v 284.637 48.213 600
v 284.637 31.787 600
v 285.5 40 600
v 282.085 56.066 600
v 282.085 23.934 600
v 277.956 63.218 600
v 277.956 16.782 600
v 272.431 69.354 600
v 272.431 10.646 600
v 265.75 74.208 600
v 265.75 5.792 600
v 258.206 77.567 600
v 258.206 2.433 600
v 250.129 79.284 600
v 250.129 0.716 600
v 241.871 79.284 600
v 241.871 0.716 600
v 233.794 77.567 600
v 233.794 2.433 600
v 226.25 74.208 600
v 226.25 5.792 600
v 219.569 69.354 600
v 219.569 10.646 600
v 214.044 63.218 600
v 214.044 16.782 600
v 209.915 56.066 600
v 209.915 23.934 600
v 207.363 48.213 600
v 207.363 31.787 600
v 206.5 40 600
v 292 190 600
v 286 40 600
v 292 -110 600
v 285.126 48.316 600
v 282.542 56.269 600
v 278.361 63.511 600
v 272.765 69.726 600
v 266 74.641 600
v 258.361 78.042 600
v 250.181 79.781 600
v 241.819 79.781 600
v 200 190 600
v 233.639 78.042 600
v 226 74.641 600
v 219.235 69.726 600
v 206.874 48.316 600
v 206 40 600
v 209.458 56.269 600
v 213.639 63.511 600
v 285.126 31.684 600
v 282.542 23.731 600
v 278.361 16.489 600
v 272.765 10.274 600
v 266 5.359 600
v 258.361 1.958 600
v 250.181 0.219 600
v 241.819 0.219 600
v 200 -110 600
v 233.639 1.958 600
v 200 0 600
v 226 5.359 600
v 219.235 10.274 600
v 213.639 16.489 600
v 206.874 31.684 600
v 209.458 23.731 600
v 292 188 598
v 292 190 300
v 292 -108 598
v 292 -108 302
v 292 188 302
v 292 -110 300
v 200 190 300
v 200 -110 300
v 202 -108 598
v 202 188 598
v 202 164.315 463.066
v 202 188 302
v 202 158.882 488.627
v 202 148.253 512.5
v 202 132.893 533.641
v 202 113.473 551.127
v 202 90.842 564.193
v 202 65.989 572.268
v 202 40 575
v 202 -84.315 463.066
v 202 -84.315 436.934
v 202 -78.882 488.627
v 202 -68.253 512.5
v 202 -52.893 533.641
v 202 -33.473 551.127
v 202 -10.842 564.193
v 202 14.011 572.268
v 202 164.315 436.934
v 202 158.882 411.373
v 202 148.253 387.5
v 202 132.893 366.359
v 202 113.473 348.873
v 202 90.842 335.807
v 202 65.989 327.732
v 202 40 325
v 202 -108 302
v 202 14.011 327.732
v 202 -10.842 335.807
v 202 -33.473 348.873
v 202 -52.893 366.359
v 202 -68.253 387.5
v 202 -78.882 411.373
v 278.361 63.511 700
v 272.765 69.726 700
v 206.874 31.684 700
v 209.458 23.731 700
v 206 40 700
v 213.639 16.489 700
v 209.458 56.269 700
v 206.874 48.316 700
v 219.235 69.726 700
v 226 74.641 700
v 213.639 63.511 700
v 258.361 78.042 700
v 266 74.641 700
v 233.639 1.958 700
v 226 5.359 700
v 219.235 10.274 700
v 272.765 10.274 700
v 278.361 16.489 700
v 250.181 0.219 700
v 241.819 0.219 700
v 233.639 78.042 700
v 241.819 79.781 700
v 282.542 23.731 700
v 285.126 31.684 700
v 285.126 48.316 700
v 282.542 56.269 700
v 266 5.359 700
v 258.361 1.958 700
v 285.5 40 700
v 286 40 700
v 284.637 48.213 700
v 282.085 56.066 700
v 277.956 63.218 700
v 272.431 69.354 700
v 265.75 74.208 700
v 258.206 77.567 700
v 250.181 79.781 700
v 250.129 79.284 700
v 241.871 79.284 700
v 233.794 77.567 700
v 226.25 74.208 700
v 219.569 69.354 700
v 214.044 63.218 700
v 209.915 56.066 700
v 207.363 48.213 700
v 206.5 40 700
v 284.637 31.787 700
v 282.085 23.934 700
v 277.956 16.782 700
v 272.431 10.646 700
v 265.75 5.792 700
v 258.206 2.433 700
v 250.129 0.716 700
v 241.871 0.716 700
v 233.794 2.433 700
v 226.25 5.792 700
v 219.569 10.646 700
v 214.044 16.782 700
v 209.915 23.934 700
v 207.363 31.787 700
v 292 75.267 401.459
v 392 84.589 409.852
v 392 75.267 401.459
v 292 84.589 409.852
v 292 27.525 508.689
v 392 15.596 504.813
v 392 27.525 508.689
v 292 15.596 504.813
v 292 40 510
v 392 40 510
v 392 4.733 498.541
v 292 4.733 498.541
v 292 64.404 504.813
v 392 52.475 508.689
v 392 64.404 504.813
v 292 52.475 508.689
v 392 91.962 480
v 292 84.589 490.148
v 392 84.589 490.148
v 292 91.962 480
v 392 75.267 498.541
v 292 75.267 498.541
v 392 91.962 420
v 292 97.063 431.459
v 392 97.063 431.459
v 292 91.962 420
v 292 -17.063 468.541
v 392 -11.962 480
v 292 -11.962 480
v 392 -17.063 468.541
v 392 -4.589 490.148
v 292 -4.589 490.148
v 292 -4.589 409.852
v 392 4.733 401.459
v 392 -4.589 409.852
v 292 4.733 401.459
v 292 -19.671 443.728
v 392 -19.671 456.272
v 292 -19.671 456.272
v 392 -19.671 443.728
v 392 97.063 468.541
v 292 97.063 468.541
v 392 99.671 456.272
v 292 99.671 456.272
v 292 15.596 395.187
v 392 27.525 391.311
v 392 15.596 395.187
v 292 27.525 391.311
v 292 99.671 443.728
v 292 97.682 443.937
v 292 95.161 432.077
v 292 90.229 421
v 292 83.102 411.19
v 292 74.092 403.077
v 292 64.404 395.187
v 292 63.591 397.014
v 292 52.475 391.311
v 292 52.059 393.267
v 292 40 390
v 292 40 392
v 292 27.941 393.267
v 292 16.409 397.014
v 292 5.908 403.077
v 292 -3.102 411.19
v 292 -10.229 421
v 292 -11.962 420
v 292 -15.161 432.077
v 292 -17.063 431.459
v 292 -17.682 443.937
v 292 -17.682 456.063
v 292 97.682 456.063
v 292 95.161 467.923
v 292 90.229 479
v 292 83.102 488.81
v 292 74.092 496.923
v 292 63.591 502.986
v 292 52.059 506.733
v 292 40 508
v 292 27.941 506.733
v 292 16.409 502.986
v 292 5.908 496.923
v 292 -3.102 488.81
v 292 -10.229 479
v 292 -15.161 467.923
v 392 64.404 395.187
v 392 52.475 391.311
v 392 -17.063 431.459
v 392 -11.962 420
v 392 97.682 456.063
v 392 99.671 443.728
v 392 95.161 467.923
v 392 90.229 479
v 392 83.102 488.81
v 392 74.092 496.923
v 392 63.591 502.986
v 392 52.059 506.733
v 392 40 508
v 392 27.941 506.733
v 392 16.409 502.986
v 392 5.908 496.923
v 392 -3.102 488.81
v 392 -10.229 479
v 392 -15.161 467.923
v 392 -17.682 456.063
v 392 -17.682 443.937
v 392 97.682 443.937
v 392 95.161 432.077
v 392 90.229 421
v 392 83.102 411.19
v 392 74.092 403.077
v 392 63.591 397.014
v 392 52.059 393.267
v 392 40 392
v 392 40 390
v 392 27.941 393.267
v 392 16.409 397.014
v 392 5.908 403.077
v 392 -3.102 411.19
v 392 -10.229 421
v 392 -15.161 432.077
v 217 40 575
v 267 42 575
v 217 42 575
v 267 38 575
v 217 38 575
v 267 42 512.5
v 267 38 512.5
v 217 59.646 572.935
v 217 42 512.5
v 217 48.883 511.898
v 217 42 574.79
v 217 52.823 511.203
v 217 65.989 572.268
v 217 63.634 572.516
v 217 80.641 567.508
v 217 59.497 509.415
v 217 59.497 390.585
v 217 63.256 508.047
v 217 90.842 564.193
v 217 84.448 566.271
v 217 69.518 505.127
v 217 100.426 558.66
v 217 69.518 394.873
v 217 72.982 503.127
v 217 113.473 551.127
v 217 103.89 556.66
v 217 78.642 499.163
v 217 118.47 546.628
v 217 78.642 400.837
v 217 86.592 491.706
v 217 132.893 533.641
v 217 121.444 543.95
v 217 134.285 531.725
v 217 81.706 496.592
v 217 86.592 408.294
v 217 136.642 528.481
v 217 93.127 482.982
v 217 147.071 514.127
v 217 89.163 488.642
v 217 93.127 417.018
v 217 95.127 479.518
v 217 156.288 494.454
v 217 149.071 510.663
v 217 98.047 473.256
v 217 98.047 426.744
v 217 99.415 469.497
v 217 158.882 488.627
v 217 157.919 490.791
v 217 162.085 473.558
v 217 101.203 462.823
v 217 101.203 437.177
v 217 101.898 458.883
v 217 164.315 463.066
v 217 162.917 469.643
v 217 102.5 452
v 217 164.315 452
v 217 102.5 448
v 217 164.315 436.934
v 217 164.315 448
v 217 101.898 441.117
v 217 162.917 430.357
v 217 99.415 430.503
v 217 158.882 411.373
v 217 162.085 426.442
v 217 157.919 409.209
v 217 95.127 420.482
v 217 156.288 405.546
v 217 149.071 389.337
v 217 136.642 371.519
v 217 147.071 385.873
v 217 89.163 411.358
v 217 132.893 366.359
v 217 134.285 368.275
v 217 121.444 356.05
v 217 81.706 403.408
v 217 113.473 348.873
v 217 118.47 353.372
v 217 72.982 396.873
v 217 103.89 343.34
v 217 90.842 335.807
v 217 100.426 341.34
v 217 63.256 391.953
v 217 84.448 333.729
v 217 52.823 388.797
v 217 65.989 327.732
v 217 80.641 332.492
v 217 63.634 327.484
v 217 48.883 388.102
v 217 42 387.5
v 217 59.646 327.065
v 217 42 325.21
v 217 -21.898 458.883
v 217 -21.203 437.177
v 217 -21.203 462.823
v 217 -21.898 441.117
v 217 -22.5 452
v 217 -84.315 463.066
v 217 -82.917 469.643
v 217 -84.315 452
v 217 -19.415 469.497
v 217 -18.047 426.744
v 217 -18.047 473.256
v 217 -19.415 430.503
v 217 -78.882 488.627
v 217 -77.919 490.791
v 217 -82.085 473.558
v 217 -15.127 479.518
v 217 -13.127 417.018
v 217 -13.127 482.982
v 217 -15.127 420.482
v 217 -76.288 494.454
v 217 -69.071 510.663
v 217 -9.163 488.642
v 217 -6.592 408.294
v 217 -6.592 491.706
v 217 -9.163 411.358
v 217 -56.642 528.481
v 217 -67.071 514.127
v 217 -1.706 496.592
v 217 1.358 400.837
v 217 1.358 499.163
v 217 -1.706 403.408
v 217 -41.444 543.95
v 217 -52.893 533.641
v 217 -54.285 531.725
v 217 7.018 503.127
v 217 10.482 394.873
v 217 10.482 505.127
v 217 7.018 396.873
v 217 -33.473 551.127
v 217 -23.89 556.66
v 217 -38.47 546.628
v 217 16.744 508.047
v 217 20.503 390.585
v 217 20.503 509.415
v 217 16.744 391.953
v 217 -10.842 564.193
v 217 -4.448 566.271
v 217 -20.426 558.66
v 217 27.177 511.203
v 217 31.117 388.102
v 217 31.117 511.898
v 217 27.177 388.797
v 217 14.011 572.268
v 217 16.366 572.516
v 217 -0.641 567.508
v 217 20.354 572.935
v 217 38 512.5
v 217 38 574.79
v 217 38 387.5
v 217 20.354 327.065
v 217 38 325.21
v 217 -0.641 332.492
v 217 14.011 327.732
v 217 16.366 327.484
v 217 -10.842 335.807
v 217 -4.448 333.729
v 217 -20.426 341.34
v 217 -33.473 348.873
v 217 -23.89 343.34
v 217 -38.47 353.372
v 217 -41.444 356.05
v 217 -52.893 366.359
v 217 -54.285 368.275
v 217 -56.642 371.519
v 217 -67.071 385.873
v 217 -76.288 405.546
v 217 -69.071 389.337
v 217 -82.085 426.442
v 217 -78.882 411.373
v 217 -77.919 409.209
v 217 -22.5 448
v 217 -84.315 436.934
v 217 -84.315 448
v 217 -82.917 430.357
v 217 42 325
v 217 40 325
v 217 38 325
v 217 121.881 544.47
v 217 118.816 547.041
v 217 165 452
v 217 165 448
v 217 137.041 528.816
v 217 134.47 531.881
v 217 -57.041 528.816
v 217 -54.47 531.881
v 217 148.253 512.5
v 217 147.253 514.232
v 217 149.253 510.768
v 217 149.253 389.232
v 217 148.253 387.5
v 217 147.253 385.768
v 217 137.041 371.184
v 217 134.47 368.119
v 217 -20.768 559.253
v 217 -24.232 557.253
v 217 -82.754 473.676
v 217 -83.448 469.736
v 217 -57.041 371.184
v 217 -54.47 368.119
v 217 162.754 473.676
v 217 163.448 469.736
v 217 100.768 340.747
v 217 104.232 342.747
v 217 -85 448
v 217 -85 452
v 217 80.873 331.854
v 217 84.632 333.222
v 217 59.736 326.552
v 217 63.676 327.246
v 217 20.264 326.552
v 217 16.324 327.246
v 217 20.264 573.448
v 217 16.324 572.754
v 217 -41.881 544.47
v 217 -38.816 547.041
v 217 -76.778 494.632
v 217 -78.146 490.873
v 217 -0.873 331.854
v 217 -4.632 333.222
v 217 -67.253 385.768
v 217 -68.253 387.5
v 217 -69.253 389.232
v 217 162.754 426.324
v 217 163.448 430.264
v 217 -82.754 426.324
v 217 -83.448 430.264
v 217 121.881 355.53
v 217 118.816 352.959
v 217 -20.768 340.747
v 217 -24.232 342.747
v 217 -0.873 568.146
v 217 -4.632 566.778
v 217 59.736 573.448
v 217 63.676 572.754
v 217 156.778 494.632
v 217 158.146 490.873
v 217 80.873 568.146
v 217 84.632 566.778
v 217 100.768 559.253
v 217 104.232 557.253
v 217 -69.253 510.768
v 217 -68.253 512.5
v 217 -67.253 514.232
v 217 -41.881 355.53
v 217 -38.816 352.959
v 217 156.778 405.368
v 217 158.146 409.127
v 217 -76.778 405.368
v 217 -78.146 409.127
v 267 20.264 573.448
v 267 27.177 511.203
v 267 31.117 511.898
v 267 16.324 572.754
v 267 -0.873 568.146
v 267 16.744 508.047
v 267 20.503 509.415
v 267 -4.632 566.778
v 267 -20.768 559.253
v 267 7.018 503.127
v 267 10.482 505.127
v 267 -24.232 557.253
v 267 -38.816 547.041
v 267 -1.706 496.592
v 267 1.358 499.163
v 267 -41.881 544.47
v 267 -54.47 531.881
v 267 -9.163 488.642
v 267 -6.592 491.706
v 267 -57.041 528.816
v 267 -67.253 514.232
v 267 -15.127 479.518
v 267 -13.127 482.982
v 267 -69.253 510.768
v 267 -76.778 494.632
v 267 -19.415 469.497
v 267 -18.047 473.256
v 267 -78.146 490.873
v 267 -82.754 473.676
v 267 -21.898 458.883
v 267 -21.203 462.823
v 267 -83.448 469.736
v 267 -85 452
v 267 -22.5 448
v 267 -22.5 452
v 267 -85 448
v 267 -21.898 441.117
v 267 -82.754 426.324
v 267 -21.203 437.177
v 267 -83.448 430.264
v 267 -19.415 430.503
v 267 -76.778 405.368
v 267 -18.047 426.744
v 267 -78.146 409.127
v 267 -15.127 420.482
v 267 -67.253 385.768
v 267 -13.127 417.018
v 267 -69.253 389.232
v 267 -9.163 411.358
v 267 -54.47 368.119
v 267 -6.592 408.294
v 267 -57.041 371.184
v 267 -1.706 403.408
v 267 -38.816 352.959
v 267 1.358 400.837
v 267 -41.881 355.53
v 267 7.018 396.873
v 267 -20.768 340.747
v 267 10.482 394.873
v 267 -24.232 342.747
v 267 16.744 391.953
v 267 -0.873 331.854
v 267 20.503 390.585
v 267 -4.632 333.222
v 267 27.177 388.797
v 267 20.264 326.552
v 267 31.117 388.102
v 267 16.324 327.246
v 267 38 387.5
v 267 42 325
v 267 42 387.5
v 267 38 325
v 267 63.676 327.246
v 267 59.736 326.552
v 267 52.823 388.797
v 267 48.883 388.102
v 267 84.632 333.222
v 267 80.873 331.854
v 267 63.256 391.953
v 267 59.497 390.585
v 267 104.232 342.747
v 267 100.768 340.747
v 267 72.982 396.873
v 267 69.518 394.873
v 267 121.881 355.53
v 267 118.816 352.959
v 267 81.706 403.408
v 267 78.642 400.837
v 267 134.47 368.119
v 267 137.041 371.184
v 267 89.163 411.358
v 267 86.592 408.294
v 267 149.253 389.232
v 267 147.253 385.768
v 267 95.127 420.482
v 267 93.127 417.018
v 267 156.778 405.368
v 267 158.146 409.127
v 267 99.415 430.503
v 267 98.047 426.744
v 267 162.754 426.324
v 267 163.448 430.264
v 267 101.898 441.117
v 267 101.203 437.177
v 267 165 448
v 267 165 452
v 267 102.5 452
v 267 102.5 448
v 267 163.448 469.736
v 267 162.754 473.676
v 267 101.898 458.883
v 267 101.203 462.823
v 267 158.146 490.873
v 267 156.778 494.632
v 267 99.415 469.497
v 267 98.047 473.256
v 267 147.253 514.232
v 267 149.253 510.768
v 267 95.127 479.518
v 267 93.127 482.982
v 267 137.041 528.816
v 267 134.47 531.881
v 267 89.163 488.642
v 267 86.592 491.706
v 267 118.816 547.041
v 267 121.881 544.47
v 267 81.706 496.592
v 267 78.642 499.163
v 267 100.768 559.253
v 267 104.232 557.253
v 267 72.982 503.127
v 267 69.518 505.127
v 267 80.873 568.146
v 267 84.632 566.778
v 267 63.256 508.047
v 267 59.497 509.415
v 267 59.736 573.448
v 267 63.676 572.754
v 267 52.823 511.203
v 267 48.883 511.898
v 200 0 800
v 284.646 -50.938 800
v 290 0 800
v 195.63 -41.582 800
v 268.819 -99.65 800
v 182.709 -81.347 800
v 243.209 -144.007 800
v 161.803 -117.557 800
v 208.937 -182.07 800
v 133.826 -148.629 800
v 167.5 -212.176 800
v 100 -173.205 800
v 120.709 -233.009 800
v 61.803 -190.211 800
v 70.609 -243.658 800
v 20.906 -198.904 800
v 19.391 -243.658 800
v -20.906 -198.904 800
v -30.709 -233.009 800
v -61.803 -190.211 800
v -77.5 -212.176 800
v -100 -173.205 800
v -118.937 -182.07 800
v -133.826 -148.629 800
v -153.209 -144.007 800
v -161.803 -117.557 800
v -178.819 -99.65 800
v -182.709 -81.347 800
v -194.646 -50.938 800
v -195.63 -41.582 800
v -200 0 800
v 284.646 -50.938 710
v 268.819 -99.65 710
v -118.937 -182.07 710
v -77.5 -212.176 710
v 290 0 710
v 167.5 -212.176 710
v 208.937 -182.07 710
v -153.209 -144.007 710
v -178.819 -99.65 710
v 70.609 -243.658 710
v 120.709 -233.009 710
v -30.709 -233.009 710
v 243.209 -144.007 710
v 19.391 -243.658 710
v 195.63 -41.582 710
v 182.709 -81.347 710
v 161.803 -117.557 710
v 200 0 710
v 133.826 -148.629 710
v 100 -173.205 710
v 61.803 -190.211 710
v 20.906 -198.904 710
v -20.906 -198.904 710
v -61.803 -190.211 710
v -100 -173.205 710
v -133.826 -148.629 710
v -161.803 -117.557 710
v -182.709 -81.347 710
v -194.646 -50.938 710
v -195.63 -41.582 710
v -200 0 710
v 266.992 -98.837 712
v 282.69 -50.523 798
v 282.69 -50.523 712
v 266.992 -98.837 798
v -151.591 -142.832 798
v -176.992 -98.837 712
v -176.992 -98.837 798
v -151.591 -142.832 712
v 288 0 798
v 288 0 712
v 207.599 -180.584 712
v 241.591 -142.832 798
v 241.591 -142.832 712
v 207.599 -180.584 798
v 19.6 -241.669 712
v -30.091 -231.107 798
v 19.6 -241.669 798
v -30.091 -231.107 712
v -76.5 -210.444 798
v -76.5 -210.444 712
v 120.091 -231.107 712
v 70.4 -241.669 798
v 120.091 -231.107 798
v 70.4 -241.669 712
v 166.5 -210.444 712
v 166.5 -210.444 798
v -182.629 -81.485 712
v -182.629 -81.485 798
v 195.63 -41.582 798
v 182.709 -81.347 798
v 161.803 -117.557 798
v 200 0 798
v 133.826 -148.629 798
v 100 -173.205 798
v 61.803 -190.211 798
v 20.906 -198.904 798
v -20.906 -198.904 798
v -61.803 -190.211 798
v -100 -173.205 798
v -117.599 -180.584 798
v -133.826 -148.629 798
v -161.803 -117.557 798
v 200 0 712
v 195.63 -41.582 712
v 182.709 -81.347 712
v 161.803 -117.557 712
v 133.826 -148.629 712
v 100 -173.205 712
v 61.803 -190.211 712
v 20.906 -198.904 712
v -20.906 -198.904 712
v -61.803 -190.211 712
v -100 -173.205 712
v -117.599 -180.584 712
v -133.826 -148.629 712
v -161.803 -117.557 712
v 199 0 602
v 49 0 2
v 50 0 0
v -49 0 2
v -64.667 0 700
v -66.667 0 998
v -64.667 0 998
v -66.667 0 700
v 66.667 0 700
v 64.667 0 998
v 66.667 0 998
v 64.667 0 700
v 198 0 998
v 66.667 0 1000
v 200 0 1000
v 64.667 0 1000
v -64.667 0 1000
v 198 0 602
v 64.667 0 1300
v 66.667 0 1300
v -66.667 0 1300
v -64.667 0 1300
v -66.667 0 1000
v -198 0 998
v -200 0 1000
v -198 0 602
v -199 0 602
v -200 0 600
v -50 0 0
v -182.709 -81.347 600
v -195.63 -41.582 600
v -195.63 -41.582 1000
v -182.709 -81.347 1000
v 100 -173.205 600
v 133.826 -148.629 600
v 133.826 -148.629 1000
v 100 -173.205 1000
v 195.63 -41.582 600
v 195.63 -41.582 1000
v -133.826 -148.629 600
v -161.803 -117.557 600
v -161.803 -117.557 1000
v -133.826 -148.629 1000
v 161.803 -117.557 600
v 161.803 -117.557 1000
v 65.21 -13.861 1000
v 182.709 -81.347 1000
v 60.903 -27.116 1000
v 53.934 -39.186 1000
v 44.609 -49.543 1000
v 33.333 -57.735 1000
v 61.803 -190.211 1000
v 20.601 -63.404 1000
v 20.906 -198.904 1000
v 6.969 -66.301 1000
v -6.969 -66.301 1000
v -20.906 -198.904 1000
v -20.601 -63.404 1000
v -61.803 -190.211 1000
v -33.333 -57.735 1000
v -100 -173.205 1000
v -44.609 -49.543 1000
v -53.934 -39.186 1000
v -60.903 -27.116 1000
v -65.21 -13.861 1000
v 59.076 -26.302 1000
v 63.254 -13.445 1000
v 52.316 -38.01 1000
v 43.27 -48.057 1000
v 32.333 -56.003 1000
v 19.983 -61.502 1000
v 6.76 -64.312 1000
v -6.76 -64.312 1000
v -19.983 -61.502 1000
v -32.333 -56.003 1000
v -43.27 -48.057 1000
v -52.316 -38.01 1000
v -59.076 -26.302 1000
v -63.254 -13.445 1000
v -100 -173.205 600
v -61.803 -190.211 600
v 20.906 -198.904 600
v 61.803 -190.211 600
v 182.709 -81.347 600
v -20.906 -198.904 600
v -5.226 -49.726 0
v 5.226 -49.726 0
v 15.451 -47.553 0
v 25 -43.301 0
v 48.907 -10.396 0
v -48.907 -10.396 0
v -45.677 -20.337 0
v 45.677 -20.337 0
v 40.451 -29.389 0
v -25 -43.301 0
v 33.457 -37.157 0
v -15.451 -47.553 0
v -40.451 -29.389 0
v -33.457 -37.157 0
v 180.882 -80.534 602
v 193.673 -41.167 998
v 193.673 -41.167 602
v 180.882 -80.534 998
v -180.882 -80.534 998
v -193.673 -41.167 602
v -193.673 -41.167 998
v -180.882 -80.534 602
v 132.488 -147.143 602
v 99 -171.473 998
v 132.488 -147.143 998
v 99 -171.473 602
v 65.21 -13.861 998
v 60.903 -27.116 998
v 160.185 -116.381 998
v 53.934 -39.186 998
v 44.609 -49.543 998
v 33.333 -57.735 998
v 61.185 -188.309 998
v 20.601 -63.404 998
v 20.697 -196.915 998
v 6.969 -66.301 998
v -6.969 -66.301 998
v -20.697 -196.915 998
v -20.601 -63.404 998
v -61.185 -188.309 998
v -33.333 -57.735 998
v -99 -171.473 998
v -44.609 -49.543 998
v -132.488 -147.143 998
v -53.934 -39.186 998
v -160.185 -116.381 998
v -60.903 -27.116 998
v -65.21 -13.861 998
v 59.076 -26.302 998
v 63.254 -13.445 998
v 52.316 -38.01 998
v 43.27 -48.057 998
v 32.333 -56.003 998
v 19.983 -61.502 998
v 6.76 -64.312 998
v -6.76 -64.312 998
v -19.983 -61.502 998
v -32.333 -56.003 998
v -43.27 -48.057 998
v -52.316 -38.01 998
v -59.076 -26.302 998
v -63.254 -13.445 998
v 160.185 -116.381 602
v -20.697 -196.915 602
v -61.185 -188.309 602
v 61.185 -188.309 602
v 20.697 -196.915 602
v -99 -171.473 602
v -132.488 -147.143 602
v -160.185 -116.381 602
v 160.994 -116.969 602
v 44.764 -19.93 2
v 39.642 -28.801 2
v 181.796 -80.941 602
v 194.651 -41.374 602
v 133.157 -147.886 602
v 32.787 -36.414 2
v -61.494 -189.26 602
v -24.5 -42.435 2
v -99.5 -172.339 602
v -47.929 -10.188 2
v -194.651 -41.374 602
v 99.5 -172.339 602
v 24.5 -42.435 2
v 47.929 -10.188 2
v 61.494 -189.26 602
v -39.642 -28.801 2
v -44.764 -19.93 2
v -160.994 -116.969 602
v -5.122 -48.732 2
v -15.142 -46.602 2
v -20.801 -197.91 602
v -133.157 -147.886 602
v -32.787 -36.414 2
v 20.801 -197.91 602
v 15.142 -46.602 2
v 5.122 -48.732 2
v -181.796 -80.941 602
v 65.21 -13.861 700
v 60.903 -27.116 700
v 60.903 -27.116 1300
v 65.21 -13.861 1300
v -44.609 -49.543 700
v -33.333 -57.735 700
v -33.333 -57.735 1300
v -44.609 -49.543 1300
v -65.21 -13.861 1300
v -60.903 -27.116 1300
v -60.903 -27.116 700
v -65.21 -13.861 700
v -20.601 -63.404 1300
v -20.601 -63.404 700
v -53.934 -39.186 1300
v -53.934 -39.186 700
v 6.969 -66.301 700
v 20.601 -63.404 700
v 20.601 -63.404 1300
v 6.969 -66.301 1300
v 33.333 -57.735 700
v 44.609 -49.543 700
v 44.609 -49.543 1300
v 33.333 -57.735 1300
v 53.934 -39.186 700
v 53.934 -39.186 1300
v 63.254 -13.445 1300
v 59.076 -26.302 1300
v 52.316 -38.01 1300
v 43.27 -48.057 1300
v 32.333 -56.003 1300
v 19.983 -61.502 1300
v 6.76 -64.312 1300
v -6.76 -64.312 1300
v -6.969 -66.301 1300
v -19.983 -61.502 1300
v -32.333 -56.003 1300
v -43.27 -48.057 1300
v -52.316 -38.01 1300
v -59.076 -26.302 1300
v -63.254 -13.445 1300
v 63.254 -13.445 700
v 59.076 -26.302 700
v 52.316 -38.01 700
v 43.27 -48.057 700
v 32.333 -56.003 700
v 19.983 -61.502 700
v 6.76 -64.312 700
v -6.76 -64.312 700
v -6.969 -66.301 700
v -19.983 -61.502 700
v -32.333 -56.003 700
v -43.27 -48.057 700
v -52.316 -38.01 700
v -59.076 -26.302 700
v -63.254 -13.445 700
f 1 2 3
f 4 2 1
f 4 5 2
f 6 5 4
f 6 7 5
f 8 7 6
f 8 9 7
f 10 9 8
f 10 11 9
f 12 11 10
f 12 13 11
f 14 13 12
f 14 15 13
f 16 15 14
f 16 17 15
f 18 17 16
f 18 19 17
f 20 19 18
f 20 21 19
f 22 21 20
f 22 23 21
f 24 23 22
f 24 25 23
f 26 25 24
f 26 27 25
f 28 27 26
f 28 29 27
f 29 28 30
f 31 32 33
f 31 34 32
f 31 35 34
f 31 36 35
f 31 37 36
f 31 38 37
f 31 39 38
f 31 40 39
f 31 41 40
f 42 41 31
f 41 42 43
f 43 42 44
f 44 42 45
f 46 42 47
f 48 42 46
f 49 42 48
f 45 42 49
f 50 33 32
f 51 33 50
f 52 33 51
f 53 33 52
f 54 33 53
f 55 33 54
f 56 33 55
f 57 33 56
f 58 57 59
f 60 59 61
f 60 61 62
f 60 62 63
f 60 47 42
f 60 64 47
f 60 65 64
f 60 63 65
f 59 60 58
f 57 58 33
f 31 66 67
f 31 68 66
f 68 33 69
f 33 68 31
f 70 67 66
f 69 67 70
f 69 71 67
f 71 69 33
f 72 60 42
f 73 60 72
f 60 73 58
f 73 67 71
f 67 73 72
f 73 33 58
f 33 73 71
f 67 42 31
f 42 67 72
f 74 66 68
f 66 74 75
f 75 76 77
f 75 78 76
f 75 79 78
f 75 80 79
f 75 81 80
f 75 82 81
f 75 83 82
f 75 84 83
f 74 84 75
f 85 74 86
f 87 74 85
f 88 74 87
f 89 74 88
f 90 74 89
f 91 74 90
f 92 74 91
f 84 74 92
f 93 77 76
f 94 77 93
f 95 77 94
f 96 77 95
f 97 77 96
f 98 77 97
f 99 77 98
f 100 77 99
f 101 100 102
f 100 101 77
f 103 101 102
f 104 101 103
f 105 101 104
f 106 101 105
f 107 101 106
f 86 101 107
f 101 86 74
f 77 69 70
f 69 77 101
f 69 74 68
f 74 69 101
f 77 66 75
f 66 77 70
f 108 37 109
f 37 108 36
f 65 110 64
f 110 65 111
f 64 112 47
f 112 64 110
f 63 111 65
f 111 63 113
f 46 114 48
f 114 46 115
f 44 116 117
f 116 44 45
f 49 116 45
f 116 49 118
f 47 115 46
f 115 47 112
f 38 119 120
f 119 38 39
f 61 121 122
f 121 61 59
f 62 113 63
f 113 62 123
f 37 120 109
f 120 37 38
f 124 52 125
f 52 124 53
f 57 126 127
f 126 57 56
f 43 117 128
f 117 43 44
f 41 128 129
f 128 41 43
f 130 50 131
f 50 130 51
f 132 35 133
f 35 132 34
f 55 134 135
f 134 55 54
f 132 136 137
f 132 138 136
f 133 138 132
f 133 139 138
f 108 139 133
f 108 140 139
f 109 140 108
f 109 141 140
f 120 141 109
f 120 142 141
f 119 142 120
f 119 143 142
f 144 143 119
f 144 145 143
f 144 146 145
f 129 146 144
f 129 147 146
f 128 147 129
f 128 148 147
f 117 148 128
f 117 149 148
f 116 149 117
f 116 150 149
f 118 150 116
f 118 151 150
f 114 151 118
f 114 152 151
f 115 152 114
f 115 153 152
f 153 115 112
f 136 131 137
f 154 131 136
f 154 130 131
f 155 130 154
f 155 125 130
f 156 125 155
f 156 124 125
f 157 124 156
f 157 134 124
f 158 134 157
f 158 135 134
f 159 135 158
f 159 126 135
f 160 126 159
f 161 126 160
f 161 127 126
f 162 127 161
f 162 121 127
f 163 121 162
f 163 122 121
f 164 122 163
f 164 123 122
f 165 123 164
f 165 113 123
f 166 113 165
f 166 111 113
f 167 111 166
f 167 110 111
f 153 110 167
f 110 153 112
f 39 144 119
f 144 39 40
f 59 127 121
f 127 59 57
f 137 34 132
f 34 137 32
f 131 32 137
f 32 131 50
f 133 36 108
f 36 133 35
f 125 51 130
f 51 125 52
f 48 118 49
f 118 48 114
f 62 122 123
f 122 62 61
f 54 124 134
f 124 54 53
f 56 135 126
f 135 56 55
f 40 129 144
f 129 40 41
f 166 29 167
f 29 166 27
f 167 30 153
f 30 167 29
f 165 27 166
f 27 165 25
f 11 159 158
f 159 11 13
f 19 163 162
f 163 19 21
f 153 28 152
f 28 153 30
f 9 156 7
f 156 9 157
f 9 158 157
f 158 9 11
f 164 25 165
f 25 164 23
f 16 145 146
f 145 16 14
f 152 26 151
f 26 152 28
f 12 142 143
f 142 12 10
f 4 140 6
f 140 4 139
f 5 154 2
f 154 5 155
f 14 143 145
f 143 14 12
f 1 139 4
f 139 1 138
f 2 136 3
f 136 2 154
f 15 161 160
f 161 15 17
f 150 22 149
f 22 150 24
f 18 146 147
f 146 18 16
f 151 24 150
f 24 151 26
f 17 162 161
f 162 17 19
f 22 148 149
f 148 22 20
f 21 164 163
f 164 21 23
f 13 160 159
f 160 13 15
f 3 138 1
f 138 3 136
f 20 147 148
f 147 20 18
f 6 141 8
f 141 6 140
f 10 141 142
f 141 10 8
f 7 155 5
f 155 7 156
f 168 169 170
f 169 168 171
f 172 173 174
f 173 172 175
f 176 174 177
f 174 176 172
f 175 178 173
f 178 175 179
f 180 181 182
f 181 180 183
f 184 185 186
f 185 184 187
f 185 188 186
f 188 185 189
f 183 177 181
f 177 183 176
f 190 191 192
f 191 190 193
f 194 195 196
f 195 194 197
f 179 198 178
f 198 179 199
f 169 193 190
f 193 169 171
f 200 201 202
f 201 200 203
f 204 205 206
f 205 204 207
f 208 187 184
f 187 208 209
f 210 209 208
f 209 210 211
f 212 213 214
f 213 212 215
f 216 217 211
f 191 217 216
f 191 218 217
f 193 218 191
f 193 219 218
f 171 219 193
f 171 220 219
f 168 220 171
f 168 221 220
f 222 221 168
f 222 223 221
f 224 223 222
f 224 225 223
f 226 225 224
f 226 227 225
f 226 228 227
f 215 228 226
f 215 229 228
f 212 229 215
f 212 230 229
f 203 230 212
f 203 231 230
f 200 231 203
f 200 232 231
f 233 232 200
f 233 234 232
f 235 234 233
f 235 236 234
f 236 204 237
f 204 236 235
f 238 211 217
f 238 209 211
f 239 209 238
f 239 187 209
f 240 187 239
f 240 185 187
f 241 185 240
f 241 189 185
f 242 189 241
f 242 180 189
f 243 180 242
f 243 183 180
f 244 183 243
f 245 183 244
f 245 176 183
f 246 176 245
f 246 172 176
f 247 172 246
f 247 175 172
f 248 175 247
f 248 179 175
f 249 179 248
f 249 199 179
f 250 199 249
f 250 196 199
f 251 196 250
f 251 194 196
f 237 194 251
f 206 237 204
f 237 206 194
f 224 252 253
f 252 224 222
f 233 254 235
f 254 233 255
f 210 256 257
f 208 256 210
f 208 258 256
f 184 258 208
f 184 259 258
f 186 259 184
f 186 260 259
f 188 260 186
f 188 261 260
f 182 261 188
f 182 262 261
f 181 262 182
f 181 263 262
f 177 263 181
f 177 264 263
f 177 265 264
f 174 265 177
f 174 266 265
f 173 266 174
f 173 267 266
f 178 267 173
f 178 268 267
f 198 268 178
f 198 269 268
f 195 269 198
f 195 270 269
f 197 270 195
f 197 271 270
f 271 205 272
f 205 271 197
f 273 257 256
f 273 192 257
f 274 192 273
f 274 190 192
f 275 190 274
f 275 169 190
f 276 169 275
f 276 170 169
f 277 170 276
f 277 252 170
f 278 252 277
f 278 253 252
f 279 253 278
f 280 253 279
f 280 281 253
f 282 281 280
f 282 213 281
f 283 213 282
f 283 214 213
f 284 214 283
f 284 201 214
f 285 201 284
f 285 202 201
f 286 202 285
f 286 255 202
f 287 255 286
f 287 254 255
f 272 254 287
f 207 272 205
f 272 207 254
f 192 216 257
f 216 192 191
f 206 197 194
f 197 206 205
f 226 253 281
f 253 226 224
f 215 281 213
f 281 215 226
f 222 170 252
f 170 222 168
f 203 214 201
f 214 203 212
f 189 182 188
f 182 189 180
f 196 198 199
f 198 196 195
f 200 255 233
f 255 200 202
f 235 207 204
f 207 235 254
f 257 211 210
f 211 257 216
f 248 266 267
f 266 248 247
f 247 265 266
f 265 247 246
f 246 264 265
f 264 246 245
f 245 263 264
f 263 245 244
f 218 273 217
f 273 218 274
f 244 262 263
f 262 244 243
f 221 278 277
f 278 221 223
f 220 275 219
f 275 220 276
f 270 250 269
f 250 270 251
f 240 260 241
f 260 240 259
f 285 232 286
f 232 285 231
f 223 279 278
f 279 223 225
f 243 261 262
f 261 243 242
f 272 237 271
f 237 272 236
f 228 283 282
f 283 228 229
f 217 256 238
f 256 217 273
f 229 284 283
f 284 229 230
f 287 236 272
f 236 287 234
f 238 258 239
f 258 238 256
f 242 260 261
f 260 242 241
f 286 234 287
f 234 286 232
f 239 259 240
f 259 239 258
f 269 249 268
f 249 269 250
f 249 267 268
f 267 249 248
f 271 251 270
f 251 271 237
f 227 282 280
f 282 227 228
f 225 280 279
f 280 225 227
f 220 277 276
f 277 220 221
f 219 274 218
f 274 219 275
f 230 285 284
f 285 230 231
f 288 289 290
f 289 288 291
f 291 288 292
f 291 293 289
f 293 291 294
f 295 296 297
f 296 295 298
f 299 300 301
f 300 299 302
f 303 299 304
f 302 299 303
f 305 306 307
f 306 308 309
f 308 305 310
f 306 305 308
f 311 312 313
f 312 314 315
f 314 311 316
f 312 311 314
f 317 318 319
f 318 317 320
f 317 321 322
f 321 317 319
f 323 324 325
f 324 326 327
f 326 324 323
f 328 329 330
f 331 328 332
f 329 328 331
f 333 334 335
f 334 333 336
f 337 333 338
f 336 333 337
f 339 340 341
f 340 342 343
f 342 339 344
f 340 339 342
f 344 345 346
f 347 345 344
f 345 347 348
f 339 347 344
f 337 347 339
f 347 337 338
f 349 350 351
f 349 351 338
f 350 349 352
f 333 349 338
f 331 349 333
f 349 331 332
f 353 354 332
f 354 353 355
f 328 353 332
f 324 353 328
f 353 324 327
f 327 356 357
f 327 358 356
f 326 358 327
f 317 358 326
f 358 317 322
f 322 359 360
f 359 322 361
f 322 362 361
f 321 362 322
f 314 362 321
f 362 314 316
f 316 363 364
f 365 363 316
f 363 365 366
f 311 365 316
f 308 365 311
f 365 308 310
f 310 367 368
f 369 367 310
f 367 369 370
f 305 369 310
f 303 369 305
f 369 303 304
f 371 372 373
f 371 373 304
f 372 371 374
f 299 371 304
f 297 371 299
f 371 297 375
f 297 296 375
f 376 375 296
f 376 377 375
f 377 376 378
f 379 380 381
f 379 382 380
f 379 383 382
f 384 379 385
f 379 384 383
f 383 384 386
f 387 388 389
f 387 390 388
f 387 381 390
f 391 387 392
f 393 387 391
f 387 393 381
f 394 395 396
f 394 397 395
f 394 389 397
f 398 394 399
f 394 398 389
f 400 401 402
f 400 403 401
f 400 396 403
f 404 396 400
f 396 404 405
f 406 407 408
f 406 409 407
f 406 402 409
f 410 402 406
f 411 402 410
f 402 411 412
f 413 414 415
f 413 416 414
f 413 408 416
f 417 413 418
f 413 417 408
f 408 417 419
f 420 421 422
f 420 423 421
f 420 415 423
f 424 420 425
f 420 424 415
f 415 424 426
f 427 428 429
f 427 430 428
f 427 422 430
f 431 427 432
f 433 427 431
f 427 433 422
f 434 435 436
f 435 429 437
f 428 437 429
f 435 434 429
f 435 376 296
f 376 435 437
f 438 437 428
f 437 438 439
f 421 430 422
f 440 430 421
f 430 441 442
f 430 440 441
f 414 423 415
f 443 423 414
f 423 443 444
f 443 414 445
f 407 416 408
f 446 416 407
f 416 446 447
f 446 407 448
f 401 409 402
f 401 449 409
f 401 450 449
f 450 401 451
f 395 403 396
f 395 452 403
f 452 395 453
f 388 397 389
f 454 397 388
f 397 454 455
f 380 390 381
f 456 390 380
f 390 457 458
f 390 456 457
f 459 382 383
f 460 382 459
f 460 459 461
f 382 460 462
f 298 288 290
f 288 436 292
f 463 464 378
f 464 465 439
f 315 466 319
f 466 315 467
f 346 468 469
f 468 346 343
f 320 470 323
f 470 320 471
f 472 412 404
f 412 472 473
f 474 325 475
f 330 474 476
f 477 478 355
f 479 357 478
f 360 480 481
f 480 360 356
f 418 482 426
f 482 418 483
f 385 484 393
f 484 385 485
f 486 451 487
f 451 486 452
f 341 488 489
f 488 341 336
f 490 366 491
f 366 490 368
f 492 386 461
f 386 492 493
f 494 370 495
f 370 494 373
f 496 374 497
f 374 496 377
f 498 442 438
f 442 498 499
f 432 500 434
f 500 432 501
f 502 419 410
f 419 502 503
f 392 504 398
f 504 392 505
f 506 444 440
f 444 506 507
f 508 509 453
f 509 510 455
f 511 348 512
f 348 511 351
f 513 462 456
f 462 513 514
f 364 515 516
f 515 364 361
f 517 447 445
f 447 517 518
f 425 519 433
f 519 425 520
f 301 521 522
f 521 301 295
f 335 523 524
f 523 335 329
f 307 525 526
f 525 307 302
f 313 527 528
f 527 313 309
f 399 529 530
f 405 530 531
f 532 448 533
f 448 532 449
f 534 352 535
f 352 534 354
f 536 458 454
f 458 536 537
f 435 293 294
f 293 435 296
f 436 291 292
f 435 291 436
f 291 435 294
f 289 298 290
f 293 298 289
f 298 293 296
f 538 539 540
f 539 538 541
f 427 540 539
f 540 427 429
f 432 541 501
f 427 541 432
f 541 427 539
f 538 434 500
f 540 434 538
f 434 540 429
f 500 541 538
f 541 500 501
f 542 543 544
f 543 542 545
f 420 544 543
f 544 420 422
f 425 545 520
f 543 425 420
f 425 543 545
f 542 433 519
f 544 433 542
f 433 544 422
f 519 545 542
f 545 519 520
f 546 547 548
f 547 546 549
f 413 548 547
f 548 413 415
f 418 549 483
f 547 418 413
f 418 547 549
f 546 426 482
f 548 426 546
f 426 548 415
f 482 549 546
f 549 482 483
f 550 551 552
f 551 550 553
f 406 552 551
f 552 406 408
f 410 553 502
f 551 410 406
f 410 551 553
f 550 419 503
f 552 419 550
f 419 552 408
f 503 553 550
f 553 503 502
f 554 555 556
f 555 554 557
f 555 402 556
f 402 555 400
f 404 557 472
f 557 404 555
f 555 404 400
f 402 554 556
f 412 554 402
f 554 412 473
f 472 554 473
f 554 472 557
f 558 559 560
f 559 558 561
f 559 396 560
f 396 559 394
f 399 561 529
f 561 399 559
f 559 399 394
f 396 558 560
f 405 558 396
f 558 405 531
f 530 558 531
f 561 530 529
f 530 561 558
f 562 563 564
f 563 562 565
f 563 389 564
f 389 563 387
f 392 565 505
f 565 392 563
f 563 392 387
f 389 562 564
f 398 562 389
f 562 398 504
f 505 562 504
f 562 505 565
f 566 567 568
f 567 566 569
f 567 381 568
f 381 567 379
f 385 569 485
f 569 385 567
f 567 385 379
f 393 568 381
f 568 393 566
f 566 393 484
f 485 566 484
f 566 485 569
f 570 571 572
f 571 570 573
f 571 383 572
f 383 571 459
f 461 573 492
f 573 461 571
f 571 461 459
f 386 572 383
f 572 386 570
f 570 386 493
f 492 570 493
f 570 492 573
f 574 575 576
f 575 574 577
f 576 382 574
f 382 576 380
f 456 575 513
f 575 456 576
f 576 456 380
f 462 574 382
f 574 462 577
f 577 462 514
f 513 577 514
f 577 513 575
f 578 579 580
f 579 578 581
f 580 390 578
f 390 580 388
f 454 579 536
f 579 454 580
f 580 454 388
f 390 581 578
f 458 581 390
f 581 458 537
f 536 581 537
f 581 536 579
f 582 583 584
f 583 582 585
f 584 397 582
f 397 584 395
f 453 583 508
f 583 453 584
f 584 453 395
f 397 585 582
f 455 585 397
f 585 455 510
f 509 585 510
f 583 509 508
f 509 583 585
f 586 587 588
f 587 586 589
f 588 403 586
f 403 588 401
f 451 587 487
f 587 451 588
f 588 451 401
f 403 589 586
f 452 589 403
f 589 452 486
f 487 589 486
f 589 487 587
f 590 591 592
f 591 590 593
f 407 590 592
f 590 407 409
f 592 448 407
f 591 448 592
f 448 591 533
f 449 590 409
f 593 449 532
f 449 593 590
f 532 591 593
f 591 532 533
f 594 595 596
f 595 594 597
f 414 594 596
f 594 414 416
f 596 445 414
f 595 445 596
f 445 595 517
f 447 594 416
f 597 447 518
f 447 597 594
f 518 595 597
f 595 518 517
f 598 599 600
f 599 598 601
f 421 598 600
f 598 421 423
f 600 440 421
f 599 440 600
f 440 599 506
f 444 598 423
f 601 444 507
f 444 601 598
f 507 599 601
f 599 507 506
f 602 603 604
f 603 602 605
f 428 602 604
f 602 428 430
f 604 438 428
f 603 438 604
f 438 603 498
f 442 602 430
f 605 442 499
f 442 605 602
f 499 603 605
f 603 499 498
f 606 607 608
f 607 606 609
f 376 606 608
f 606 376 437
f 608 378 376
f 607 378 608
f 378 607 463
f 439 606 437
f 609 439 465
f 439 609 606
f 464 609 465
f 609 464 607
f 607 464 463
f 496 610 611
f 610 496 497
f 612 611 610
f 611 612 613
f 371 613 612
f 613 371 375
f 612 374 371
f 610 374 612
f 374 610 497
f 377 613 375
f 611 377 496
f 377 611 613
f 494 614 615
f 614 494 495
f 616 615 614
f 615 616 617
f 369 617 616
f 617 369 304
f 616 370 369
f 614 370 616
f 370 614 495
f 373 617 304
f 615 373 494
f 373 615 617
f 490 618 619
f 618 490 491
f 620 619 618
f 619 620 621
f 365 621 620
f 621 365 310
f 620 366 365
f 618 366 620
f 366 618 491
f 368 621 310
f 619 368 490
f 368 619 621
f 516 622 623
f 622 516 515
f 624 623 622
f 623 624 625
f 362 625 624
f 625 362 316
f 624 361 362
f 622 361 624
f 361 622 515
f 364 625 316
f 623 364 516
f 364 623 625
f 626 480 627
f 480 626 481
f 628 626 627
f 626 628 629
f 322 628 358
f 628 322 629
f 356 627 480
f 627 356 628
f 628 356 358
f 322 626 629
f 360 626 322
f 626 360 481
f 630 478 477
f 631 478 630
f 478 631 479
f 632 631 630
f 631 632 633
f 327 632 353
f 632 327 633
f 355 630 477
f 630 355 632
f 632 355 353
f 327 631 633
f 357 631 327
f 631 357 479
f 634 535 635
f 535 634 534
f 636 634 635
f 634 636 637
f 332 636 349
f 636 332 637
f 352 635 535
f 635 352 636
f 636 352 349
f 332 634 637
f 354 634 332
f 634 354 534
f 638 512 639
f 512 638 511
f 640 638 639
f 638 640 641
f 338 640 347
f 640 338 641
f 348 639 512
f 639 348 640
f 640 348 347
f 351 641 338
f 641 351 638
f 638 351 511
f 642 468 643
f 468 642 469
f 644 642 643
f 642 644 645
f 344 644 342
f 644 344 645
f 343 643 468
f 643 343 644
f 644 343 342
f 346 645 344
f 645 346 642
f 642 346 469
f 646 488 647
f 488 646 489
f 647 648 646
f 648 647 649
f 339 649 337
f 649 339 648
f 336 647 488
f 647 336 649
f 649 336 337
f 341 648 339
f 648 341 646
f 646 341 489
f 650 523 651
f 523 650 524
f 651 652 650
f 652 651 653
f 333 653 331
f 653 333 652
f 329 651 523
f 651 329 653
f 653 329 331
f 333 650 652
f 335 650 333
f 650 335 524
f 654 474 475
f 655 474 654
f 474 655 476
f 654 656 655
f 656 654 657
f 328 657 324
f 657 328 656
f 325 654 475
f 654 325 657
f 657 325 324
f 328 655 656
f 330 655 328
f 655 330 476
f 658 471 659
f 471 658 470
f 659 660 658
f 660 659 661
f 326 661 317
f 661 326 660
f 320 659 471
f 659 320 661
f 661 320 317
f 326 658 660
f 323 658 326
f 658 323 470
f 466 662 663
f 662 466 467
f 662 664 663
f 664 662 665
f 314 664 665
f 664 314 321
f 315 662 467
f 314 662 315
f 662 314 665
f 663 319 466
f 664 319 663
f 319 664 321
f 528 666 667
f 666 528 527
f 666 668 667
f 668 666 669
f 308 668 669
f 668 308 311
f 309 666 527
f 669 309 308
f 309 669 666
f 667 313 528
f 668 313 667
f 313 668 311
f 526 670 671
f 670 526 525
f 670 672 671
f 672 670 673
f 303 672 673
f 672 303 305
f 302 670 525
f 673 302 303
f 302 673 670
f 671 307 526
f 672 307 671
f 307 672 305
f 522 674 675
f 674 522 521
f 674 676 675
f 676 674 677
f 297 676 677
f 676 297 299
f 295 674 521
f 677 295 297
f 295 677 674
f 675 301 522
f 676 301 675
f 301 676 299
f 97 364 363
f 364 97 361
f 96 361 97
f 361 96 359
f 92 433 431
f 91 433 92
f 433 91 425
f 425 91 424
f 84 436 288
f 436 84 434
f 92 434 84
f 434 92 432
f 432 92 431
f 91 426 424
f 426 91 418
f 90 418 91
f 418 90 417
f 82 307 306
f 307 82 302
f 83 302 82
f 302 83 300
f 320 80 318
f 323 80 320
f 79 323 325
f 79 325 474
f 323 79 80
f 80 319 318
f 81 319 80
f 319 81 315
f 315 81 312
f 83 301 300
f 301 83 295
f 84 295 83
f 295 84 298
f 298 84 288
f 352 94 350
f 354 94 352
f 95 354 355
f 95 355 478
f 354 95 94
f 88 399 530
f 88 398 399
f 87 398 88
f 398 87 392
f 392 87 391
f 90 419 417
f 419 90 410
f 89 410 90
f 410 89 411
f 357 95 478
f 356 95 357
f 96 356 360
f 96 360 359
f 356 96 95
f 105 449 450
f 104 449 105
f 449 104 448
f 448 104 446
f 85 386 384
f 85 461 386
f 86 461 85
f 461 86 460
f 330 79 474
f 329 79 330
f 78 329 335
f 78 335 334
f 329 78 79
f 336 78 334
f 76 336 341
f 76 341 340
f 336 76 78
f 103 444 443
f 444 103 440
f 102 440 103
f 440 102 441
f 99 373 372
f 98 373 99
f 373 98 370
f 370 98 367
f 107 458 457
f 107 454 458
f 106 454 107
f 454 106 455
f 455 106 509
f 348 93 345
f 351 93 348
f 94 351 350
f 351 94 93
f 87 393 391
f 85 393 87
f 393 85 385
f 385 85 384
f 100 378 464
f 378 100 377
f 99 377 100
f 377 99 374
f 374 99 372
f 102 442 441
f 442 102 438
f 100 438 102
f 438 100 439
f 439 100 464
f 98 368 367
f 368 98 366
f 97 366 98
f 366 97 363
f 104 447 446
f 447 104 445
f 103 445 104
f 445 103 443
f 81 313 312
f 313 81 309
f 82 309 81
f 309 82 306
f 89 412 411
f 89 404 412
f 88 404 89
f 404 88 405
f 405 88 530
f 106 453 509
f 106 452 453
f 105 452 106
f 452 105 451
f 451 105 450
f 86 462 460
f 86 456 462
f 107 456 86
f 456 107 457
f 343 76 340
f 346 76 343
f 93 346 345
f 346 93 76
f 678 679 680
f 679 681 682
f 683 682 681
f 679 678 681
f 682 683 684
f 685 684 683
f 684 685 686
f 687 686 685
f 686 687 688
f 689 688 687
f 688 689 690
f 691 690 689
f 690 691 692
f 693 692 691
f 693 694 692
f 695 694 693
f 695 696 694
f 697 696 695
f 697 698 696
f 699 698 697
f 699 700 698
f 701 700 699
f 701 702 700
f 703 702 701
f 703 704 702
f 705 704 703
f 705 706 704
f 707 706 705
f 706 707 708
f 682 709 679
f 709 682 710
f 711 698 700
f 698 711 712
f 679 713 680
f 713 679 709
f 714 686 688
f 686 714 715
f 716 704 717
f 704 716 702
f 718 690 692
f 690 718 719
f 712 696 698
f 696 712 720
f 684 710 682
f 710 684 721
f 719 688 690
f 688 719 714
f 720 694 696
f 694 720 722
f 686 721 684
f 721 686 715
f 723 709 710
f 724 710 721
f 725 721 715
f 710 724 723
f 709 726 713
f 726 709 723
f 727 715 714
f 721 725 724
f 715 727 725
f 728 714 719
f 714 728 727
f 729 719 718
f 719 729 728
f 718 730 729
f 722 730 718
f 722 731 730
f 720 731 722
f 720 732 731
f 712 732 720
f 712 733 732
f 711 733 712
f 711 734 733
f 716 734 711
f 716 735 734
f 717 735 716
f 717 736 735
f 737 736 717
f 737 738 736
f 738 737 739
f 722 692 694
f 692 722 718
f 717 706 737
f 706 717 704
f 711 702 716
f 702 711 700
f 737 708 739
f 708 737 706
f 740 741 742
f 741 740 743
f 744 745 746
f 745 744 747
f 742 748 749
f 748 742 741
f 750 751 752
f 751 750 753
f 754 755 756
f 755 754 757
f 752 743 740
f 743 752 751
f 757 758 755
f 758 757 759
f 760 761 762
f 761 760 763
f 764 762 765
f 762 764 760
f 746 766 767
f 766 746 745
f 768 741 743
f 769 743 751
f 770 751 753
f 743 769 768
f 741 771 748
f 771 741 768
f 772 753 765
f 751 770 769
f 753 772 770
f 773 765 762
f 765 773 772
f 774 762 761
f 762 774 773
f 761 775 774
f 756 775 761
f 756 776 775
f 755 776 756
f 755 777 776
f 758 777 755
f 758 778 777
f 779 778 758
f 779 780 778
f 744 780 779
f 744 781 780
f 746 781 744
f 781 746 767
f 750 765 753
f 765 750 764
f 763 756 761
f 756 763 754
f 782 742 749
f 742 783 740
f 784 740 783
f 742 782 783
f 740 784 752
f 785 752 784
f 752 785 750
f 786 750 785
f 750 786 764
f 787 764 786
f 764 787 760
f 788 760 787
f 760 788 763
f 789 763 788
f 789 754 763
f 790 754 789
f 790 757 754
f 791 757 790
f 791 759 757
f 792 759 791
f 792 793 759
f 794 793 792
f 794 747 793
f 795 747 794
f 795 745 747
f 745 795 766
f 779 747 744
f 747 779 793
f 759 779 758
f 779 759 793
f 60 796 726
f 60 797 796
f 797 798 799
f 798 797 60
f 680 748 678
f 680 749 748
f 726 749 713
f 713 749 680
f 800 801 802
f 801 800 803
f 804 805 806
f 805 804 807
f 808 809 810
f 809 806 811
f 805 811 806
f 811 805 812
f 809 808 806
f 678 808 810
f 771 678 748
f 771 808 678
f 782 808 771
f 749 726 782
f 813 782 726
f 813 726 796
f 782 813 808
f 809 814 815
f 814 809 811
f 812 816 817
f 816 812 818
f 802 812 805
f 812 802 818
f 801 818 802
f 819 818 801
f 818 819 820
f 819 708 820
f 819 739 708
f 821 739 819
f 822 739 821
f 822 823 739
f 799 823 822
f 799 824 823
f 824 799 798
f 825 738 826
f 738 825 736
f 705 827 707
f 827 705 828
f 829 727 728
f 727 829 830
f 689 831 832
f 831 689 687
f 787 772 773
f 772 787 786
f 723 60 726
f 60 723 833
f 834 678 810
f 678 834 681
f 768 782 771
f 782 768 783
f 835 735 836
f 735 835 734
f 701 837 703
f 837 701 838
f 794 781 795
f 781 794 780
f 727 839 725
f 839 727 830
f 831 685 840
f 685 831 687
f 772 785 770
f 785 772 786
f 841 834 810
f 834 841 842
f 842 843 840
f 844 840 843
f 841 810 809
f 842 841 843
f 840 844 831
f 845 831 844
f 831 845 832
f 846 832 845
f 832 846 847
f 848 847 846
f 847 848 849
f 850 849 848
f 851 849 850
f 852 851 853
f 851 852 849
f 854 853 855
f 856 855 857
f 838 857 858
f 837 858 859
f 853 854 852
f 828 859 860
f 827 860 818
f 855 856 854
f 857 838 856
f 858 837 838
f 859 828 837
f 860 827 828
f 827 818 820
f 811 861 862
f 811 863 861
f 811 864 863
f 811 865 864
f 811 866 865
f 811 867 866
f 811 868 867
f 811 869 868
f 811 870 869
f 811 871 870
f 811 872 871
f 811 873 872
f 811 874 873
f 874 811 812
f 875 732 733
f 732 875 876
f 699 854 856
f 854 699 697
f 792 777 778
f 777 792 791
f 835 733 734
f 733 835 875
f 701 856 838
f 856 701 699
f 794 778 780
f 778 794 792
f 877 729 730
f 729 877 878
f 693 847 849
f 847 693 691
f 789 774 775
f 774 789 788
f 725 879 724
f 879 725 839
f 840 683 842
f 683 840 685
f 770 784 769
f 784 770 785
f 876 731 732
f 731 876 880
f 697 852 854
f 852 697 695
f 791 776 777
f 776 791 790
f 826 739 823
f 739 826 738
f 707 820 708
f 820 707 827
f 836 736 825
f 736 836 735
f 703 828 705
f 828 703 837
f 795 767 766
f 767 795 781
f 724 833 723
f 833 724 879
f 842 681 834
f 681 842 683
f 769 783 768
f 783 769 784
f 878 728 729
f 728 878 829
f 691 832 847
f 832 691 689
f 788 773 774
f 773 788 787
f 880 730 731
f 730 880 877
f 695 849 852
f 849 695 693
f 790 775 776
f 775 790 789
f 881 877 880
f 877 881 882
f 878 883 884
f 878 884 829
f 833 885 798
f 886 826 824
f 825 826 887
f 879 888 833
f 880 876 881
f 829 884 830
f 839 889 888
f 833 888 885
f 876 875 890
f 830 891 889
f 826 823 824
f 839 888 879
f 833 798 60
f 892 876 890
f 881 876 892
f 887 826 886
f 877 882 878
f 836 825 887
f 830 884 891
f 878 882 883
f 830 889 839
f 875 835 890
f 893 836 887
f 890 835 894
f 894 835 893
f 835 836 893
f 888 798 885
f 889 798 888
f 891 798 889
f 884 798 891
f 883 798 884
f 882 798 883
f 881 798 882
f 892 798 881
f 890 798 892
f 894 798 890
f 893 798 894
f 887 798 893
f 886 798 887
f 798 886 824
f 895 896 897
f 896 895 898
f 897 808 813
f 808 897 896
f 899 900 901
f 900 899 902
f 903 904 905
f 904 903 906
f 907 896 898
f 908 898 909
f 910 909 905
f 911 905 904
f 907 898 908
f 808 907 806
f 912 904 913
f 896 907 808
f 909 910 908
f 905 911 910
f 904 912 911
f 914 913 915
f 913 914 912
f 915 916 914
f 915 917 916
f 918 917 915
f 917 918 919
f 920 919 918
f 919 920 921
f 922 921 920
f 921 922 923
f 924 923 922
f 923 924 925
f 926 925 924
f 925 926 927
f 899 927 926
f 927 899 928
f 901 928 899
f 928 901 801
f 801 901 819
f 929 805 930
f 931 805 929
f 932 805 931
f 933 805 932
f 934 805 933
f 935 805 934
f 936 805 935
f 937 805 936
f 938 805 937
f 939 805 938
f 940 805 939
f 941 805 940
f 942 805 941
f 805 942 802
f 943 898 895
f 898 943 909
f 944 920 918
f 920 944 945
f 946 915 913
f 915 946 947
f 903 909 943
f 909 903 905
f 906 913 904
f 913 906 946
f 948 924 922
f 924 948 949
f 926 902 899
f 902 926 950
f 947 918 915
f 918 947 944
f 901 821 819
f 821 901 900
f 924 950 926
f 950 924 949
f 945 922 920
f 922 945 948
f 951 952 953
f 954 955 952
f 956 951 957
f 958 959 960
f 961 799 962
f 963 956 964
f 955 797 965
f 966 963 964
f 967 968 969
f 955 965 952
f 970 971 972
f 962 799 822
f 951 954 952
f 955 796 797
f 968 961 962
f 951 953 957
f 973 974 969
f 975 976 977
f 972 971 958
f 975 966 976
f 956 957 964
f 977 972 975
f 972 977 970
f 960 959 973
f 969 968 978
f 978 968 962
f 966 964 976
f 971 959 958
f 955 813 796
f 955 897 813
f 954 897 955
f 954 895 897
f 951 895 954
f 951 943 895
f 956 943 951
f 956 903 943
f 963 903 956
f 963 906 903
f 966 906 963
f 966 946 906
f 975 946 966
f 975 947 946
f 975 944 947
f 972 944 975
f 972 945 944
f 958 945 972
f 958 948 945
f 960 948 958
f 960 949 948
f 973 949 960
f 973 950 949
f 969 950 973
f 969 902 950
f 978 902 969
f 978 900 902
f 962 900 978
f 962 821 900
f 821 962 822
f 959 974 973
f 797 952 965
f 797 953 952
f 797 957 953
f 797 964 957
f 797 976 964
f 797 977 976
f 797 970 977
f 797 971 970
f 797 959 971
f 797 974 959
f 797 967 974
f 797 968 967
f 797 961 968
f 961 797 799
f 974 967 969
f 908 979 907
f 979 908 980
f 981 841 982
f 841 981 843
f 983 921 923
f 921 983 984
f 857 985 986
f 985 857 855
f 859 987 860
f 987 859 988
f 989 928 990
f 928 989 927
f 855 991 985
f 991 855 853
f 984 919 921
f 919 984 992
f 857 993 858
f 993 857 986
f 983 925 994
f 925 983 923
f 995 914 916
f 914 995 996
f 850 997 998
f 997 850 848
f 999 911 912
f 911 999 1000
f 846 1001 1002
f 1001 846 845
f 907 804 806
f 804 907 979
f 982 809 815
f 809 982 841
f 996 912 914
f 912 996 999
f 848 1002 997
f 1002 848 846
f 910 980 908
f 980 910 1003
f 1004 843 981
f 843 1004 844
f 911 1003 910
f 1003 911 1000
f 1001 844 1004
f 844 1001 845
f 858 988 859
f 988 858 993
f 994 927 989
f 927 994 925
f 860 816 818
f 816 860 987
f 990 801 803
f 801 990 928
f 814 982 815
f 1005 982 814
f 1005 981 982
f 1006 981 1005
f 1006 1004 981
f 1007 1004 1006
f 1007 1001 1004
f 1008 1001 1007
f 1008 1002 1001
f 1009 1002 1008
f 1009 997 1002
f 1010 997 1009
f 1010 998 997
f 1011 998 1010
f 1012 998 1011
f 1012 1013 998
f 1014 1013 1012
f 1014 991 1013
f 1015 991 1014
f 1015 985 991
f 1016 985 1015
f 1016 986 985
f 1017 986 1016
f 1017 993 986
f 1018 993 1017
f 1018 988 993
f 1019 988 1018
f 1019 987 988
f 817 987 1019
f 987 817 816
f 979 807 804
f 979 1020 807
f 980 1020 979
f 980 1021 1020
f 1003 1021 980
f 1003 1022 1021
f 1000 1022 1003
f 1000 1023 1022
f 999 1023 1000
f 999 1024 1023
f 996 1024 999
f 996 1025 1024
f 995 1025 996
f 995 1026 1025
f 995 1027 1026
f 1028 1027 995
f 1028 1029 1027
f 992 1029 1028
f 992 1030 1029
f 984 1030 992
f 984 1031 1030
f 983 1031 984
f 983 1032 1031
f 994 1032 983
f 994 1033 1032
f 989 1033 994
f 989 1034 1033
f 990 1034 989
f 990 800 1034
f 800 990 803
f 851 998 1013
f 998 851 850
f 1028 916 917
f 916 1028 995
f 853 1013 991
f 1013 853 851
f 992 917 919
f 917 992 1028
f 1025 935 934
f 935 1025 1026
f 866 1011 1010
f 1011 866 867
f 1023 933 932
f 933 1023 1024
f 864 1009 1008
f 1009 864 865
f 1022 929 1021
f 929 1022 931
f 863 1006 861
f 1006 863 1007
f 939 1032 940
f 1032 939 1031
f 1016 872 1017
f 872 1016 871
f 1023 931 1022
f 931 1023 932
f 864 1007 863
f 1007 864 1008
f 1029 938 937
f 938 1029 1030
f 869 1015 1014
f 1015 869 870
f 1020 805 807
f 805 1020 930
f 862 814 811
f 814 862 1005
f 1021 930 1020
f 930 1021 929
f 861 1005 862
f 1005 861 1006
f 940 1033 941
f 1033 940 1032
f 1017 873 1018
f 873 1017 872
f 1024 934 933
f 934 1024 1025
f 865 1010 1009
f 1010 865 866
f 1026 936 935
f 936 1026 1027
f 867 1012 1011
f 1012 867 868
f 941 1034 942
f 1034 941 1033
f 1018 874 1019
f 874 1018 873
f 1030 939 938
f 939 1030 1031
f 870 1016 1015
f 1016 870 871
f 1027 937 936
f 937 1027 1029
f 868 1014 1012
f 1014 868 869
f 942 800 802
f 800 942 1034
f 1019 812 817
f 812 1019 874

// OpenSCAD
// file: plenum.scad
include <constants.scad>

module plenum() {

	module plenum_cylinder() {

		module plenum_entry_port() {
			translate([plenum_entry_width/2,0,plenum_entry_height - plenum_entry_width]) {
				difference() {
					cylinder(h=plenum_entry_width, d=plenum_diameter+plenum_entry_width);
					translate([0,0,plenum_wall_thickness])
						cylinder(h=plenum_entry_width - plenum_wall_thickness*2, d=plenum_diameter+plenum_entry_width-plenum_wall_thickness*2);
					translate([-(plenum_diameter+plenum_entry_width)/2,0,-1]) cube([plenum_diameter+plenum_entry_width+1, (plenum_diameter+plenum_entry_width)/2  +1, plenum_entry_width+2]);
				}
			}
		}


		module plenum_shell() {
			translate([0,0,plenum_taper])
			cylinder(h=plenum_height-plenum_taper,d=plenum_diameter);
			cylinder(h=plenum_taper, d1=plenum_taper_to, d2=plenum_diameter);
			plenum_entry_port();
		}

		difference() {
			plenum_shell();
			translate([0,0,plenum_wall_thickness]) {
				translate([0,0,plenum_taper-plenum_wall_thickness])
				cylinder(
					h=plenum_height - plenum_wall_thickness - plenum_taper,
					d=plenum_diameter - plenum_wall_thickness*2);
				cylinder(
					h=plenum_taper,
					d1=plenum_taper_to-plenum_wall_thickness,
					d2=plenum_diameter-plenum_wall_thickness
				);
			}

		}
	
	}

	module plenum_output() {
		translate([0,0,plenum_height - plenum_port2_inner_length]){
			difference(){
				cylinder(
					h=plenum_port2_inner_length + plenum_port2_outer_length,
					d=plenum_port2_diameter
				);
				translate([0,0,-1])
				cylinder(
					h=plenum_port2_inner_length + plenum_port2_outer_length +2,
					d=plenum_port2_diameter-plenum_wall_thickness*2
				);
			}
		}
	}

	module solids() {
	plenum_cylinder();
	plenum_output();
	}

	difference () {
		solids();
		if(plenum_show_section) translate([-1500,0,-1]) cube(3000);
	}
}
// file: intake.scad
include <constants.scad>

module intake_assembly() {
	box_height = intake_material_thickness + max(fan_base_thickness+fan_height, intake_port2_diameter) + 10;

	module intake_box() {
		translate([-intake_box_size/2,-intake_box_size/2,0]) {
			difference() {
				cube([intake_box_size,intake_box_size,box_height]);
				translate([
					intake_material_thickness,
					intake_material_thickness,
					intake_material_thickness])
				cube([
					intake_box_size-intake_material_thickness*2,
					intake_box_size-intake_material_thickness*2,
					box_height-intake_material_thickness]);
			}
		}
	}

	module intake_port() {
		translate([0,0, box_height])
		difference() {
			cylinder(h=intake_port1_length, d=intake_port1_diameter);
			cylinder(
				h=intake_port1_length,
				d=intake_port1_diameter-intake_material_thickness*2
			);
		}
	}

	module intake_fan() {
		module fan_blade() {
			translate([fan_diameter_inner/2, -fan_blade_thickness/2, 0])
			cube([
				(fan_diameter_outer-fan_diameter_inner)/2,
				fan_blade_thickness,
				fan_height
			]);
		}

		translate([0,0,intake_material_thickness]) {
			cylinder(h=fan_base_thickness, d=fan_diameter_outer);

			translate([0,0,fan_base_thickness]) {
			for(i=[0:fan_blades])
				rotate([0,0, (360/fan_blades)*i]) {
				fan_blade();
				}
			}

		}

	}

	module output_port() {
		translate([intake_box_size/2,0,(box_height)/2]) {
			rotate([0,90,0])
			difference() {
			cylinder(
				h=intake_port2_length,
				d=intake_port2_diameter
			);
			cylinder(
				h=intake_port2_length,
				d=intake_port2_diameter - intake_material_thickness/2
			);
			}

		}
	}

	intake_box();
	output_port();
	intake_port();
	intake_fan();

}
// file: constants.scad
intake_material_thickness=2;
intake_port1_diameter=120;
intake_port1_length=100;

intake_port2_diameter=80;
intake_port2_length=100;

fan_diameter_inner = 125;
fan_diameter_outer = 250;
fan_base_thickness = 15;
fan_blades = 36;
fan_blade_thickness = 4;
fan_height = 50;

intake_box_size = 300;




plenum_show_section=1;
plenum_diameter=400;
plenum_height=1000;
plenum_taper=600;
plenum_taper_to=100;

plenum_wall_thickness = 2;

plenum_port1_diameter = 80;
plenum_port1_length = 100;

plenum_port2_diameter = plenum_diameter / 3;
plenum_port2_inner_length = 300;
plenum_port2_outer_length = 300;

plenum_entry_height = plenum_height - 200;
plenum_entry_width = plenum_port1_diameter + 10;
// main file
include <constants.scad>
include <intake.scad>
include <plenum.scad>

plenum_show_section=1;

translate([plenum_diameter/2,intake_port2_diameter/2,plenum_taper - intake_box_size/2]) rotate([90,-90,90]) intake_assembly();
plenum();
